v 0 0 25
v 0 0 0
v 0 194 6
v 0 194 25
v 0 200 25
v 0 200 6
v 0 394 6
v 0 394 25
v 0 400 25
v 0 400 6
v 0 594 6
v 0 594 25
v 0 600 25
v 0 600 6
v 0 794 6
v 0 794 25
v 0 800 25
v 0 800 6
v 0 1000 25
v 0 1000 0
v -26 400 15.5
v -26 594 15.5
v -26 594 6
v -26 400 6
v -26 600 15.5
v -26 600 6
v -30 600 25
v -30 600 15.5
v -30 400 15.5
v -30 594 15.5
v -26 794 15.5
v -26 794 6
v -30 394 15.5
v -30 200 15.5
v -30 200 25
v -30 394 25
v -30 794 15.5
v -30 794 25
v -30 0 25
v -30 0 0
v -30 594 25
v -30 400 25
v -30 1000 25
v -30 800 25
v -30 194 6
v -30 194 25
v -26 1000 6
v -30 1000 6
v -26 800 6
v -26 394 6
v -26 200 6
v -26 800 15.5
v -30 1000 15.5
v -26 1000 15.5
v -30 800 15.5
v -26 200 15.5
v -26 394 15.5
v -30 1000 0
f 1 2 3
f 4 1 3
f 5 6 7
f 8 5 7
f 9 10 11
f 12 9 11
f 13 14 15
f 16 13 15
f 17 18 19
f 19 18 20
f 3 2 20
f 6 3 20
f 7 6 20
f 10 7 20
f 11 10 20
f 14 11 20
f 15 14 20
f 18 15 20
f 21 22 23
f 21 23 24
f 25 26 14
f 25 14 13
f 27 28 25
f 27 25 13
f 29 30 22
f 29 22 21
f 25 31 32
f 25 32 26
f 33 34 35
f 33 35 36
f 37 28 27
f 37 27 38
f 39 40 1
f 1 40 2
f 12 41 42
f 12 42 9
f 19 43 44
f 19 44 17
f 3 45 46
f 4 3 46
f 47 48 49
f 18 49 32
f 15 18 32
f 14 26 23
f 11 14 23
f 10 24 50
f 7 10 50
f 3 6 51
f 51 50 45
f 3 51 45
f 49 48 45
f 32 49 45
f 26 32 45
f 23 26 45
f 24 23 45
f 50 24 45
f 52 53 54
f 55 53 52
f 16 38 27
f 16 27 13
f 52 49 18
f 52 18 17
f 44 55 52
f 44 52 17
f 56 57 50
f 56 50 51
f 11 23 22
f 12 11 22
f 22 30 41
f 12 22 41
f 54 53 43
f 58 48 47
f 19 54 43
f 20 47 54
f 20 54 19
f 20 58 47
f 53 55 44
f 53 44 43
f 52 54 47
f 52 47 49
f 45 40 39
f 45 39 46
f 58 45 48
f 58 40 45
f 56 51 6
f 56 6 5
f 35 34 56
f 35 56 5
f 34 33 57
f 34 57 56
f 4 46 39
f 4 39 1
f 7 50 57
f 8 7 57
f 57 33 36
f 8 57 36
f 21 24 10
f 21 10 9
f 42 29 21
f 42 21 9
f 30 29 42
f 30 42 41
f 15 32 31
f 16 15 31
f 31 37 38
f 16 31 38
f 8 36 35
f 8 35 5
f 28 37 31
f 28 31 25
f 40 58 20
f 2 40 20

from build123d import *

# Parameters (mm, degrees)
F0_W     = 30
F0_H     = 1000
F1_DEPTH = 25
F2_W     = 6
F2_H     = 19
F3_DEPTH = 30.001
F4_DEPTH = 30.001
F5_W     = 200
F5_H     = 9.5
F5_W_2   = 194
F6_DEPTH = 4


with BuildPart() as f1:
    # F0 (on Top) → F1 (new body)
    with BuildSketch(Plane.XY):
        with Locations((-15, 500)):
            Rectangle(F0_W, F0_H)
    extrude(amount=F1_DEPTH)

    # F2 (on face) → F3 (cut, through all)
    with BuildSketch(Plane(origin=(-30, 0, 0), x_dir=(0, -1, 0), z_dir=(-1, 0, 0))):
        with Locations((-797, 15.5)):
            Rectangle(F2_W, F2_H)
    extrude(amount=-F3_DEPTH, mode=Mode.SUBTRACT)

    # F2 (on face) → F4 (cut, through all)
    with BuildSketch(Plane(origin=(-30, 0, 0), x_dir=(0, -1, 0), z_dir=(-1, 0, 0))):
        with Locations((-797, 15.5)):
            Rectangle(F2_W, F2_H)
        with Locations((-597, 15.5)):
            Rectangle(F2_W, F2_H)
        with Locations((-397, 15.5)):
            Rectangle(F2_W, F2_H)
        with Locations((-197, 15.5)):
            Rectangle(F2_W, F2_H)
    extrude(amount=-F4_DEPTH, mode=Mode.SUBTRACT)

    # F5 (on face) → F6 (cut)
    with BuildSketch(Plane(origin=(-30, 0, 0), x_dir=(0, -1, 0), z_dir=(-1, 0, 0))):
        with Locations((-900, 10.75)):
            Rectangle(F5_W, F5_H)
        with Locations((-697, 10.75)):
            Rectangle(F5_W_2, F5_H)
        with Locations((-297, 10.75)):
            Rectangle(F5_W_2, F5_H)
        with Locations((-497, 10.75)):
            Rectangle(F5_W_2, F5_H)
    extrude(amount=-F6_DEPTH, mode=Mode.SUBTRACT)


solid = f1.part
